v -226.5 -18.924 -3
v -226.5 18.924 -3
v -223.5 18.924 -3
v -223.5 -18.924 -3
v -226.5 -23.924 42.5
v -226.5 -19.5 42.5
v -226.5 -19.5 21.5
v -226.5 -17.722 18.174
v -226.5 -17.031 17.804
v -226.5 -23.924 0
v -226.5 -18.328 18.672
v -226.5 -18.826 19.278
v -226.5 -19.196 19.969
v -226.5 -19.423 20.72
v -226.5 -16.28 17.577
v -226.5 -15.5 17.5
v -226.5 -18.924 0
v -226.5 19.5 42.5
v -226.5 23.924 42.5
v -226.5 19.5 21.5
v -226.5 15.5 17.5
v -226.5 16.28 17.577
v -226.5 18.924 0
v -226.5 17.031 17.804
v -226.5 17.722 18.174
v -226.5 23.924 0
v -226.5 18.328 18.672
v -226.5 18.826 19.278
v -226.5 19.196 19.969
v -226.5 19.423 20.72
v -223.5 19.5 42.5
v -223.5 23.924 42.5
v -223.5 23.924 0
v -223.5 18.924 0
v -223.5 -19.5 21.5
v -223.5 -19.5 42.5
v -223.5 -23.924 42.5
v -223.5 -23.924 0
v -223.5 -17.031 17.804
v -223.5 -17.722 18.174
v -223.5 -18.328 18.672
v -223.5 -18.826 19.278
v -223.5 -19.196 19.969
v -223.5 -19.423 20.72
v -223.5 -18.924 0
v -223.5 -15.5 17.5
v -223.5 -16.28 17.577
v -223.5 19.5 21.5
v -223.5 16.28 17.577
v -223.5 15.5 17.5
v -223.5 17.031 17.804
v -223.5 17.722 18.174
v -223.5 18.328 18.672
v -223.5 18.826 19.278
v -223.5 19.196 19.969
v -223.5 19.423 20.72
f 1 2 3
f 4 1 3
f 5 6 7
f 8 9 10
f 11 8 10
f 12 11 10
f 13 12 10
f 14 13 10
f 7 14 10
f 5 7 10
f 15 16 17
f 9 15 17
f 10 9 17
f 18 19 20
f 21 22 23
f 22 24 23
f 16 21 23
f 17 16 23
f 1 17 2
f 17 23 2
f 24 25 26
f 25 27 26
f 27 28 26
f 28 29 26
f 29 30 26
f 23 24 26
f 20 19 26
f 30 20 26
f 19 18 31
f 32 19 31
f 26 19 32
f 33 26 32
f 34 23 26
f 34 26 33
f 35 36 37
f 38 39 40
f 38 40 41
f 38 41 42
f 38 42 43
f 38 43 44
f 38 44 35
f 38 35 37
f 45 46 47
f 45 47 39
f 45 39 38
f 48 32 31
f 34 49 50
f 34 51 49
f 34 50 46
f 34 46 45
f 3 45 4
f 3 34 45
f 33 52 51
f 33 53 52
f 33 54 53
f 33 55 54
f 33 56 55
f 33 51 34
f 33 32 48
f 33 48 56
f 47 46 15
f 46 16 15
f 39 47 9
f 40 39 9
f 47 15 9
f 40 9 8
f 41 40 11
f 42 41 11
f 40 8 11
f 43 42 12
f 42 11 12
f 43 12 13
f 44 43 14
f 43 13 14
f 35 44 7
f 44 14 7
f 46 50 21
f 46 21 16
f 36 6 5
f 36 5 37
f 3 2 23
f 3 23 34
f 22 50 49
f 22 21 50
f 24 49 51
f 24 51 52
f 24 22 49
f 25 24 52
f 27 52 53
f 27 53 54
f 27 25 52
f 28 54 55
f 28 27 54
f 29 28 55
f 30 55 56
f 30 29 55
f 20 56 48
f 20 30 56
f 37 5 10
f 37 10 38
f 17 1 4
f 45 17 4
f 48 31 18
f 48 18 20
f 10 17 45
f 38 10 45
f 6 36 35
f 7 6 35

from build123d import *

# Parameters (mm, degrees)
ESTRUSIONE_ESTRUSIONE1_DEPTH      = 17.5
ESTRUSIONE_ESTRUSIONE1_DEPTH_BACK = 3
SCHIZZO1_W                        = 3
SCHIZZO1_H                        = 37.84787706
SCHIZZO2_W                        = 3
SCHIZZO2_H                        = 42.5
ESTRUSIONE_ESTRUSIONE2_DEPTH      = 5
SCHIZZO3_W                        = 25
SCHIZZO3_H                        = 0.57606147
TAGLIO_ESTRUSIONE1_DEPTH          = 10
RACCORDO1_R                       = 4
RACCORDO1_OF_SPECCHIA1_R          = 4


with BuildPart() as part:
    # Schizzo1 → Estrusione-Estrusione1 (new, two sides: drawn at the far end of the back side and taken through both)
    with BuildSketch(Plane.XY.offset(-ESTRUSIONE_ESTRUSIONE1_DEPTH_BACK)):
        with Locations((-225, 0)):
            Rectangle(SCHIZZO1_W, SCHIZZO1_H)
    extrude(amount=ESTRUSIONE_ESTRUSIONE1_DEPTH + ESTRUSIONE_ESTRUSIONE1_DEPTH_BACK)

    # Schizzo2 → Estrusione-Estrusione2 (add)
    with BuildSketch(Plane(origin=(0, 18.92393853, 0), x_dir=(1, 0, 0), z_dir=(0, 1, 0))):
        with Locations((-225, -21.25)):
            Rectangle(SCHIZZO2_W, SCHIZZO2_H)
    estrusione_estrusione2 = extrude(amount=ESTRUSIONE_ESTRUSIONE2_DEPTH)

    # Schizzo3 → Taglio-Estrusione1 (cut)
    with BuildSketch(Plane(origin=(-223.5, 0, 0), x_dir=(0, 0, -1), z_dir=(1, 0, 0))):
        with Locations((-30, 19.211969265)):
            Rectangle(SCHIZZO3_W, SCHIZZO3_H)
    taglio_estrusione1 = extrude(amount=-TAGLIO_ESTRUSIONE1_DEPTH, mode=Mode.SUBTRACT)

    # Raccordo1
    raccordo1_edges = [part.edges().sort_by_distance(p)[0] for p in [
        (-225, 19.5, 17.5),
    ]]
    fillet(raccordo1_edges, radius=RACCORDO1_R)

    # Specchia1: Estrusione-Estrusione2, Taglio-Estrusione1 across plane
    add(estrusione_estrusione2.mirror(Plane.ZX))
    add(taglio_estrusione1.mirror(Plane.ZX), mode=Mode.SUBTRACT)

    # Raccordo1 of Specchia1
    raccordo1_of_specchia1_edges = [part.edges().sort_by_distance(p)[0] for p in [
        (-225, -19.5, 17.5),
    ]]
    fillet(raccordo1_of_specchia1_edges, radius=RACCORDO1_OF_SPECCHIA1_R)


solid = part.part
